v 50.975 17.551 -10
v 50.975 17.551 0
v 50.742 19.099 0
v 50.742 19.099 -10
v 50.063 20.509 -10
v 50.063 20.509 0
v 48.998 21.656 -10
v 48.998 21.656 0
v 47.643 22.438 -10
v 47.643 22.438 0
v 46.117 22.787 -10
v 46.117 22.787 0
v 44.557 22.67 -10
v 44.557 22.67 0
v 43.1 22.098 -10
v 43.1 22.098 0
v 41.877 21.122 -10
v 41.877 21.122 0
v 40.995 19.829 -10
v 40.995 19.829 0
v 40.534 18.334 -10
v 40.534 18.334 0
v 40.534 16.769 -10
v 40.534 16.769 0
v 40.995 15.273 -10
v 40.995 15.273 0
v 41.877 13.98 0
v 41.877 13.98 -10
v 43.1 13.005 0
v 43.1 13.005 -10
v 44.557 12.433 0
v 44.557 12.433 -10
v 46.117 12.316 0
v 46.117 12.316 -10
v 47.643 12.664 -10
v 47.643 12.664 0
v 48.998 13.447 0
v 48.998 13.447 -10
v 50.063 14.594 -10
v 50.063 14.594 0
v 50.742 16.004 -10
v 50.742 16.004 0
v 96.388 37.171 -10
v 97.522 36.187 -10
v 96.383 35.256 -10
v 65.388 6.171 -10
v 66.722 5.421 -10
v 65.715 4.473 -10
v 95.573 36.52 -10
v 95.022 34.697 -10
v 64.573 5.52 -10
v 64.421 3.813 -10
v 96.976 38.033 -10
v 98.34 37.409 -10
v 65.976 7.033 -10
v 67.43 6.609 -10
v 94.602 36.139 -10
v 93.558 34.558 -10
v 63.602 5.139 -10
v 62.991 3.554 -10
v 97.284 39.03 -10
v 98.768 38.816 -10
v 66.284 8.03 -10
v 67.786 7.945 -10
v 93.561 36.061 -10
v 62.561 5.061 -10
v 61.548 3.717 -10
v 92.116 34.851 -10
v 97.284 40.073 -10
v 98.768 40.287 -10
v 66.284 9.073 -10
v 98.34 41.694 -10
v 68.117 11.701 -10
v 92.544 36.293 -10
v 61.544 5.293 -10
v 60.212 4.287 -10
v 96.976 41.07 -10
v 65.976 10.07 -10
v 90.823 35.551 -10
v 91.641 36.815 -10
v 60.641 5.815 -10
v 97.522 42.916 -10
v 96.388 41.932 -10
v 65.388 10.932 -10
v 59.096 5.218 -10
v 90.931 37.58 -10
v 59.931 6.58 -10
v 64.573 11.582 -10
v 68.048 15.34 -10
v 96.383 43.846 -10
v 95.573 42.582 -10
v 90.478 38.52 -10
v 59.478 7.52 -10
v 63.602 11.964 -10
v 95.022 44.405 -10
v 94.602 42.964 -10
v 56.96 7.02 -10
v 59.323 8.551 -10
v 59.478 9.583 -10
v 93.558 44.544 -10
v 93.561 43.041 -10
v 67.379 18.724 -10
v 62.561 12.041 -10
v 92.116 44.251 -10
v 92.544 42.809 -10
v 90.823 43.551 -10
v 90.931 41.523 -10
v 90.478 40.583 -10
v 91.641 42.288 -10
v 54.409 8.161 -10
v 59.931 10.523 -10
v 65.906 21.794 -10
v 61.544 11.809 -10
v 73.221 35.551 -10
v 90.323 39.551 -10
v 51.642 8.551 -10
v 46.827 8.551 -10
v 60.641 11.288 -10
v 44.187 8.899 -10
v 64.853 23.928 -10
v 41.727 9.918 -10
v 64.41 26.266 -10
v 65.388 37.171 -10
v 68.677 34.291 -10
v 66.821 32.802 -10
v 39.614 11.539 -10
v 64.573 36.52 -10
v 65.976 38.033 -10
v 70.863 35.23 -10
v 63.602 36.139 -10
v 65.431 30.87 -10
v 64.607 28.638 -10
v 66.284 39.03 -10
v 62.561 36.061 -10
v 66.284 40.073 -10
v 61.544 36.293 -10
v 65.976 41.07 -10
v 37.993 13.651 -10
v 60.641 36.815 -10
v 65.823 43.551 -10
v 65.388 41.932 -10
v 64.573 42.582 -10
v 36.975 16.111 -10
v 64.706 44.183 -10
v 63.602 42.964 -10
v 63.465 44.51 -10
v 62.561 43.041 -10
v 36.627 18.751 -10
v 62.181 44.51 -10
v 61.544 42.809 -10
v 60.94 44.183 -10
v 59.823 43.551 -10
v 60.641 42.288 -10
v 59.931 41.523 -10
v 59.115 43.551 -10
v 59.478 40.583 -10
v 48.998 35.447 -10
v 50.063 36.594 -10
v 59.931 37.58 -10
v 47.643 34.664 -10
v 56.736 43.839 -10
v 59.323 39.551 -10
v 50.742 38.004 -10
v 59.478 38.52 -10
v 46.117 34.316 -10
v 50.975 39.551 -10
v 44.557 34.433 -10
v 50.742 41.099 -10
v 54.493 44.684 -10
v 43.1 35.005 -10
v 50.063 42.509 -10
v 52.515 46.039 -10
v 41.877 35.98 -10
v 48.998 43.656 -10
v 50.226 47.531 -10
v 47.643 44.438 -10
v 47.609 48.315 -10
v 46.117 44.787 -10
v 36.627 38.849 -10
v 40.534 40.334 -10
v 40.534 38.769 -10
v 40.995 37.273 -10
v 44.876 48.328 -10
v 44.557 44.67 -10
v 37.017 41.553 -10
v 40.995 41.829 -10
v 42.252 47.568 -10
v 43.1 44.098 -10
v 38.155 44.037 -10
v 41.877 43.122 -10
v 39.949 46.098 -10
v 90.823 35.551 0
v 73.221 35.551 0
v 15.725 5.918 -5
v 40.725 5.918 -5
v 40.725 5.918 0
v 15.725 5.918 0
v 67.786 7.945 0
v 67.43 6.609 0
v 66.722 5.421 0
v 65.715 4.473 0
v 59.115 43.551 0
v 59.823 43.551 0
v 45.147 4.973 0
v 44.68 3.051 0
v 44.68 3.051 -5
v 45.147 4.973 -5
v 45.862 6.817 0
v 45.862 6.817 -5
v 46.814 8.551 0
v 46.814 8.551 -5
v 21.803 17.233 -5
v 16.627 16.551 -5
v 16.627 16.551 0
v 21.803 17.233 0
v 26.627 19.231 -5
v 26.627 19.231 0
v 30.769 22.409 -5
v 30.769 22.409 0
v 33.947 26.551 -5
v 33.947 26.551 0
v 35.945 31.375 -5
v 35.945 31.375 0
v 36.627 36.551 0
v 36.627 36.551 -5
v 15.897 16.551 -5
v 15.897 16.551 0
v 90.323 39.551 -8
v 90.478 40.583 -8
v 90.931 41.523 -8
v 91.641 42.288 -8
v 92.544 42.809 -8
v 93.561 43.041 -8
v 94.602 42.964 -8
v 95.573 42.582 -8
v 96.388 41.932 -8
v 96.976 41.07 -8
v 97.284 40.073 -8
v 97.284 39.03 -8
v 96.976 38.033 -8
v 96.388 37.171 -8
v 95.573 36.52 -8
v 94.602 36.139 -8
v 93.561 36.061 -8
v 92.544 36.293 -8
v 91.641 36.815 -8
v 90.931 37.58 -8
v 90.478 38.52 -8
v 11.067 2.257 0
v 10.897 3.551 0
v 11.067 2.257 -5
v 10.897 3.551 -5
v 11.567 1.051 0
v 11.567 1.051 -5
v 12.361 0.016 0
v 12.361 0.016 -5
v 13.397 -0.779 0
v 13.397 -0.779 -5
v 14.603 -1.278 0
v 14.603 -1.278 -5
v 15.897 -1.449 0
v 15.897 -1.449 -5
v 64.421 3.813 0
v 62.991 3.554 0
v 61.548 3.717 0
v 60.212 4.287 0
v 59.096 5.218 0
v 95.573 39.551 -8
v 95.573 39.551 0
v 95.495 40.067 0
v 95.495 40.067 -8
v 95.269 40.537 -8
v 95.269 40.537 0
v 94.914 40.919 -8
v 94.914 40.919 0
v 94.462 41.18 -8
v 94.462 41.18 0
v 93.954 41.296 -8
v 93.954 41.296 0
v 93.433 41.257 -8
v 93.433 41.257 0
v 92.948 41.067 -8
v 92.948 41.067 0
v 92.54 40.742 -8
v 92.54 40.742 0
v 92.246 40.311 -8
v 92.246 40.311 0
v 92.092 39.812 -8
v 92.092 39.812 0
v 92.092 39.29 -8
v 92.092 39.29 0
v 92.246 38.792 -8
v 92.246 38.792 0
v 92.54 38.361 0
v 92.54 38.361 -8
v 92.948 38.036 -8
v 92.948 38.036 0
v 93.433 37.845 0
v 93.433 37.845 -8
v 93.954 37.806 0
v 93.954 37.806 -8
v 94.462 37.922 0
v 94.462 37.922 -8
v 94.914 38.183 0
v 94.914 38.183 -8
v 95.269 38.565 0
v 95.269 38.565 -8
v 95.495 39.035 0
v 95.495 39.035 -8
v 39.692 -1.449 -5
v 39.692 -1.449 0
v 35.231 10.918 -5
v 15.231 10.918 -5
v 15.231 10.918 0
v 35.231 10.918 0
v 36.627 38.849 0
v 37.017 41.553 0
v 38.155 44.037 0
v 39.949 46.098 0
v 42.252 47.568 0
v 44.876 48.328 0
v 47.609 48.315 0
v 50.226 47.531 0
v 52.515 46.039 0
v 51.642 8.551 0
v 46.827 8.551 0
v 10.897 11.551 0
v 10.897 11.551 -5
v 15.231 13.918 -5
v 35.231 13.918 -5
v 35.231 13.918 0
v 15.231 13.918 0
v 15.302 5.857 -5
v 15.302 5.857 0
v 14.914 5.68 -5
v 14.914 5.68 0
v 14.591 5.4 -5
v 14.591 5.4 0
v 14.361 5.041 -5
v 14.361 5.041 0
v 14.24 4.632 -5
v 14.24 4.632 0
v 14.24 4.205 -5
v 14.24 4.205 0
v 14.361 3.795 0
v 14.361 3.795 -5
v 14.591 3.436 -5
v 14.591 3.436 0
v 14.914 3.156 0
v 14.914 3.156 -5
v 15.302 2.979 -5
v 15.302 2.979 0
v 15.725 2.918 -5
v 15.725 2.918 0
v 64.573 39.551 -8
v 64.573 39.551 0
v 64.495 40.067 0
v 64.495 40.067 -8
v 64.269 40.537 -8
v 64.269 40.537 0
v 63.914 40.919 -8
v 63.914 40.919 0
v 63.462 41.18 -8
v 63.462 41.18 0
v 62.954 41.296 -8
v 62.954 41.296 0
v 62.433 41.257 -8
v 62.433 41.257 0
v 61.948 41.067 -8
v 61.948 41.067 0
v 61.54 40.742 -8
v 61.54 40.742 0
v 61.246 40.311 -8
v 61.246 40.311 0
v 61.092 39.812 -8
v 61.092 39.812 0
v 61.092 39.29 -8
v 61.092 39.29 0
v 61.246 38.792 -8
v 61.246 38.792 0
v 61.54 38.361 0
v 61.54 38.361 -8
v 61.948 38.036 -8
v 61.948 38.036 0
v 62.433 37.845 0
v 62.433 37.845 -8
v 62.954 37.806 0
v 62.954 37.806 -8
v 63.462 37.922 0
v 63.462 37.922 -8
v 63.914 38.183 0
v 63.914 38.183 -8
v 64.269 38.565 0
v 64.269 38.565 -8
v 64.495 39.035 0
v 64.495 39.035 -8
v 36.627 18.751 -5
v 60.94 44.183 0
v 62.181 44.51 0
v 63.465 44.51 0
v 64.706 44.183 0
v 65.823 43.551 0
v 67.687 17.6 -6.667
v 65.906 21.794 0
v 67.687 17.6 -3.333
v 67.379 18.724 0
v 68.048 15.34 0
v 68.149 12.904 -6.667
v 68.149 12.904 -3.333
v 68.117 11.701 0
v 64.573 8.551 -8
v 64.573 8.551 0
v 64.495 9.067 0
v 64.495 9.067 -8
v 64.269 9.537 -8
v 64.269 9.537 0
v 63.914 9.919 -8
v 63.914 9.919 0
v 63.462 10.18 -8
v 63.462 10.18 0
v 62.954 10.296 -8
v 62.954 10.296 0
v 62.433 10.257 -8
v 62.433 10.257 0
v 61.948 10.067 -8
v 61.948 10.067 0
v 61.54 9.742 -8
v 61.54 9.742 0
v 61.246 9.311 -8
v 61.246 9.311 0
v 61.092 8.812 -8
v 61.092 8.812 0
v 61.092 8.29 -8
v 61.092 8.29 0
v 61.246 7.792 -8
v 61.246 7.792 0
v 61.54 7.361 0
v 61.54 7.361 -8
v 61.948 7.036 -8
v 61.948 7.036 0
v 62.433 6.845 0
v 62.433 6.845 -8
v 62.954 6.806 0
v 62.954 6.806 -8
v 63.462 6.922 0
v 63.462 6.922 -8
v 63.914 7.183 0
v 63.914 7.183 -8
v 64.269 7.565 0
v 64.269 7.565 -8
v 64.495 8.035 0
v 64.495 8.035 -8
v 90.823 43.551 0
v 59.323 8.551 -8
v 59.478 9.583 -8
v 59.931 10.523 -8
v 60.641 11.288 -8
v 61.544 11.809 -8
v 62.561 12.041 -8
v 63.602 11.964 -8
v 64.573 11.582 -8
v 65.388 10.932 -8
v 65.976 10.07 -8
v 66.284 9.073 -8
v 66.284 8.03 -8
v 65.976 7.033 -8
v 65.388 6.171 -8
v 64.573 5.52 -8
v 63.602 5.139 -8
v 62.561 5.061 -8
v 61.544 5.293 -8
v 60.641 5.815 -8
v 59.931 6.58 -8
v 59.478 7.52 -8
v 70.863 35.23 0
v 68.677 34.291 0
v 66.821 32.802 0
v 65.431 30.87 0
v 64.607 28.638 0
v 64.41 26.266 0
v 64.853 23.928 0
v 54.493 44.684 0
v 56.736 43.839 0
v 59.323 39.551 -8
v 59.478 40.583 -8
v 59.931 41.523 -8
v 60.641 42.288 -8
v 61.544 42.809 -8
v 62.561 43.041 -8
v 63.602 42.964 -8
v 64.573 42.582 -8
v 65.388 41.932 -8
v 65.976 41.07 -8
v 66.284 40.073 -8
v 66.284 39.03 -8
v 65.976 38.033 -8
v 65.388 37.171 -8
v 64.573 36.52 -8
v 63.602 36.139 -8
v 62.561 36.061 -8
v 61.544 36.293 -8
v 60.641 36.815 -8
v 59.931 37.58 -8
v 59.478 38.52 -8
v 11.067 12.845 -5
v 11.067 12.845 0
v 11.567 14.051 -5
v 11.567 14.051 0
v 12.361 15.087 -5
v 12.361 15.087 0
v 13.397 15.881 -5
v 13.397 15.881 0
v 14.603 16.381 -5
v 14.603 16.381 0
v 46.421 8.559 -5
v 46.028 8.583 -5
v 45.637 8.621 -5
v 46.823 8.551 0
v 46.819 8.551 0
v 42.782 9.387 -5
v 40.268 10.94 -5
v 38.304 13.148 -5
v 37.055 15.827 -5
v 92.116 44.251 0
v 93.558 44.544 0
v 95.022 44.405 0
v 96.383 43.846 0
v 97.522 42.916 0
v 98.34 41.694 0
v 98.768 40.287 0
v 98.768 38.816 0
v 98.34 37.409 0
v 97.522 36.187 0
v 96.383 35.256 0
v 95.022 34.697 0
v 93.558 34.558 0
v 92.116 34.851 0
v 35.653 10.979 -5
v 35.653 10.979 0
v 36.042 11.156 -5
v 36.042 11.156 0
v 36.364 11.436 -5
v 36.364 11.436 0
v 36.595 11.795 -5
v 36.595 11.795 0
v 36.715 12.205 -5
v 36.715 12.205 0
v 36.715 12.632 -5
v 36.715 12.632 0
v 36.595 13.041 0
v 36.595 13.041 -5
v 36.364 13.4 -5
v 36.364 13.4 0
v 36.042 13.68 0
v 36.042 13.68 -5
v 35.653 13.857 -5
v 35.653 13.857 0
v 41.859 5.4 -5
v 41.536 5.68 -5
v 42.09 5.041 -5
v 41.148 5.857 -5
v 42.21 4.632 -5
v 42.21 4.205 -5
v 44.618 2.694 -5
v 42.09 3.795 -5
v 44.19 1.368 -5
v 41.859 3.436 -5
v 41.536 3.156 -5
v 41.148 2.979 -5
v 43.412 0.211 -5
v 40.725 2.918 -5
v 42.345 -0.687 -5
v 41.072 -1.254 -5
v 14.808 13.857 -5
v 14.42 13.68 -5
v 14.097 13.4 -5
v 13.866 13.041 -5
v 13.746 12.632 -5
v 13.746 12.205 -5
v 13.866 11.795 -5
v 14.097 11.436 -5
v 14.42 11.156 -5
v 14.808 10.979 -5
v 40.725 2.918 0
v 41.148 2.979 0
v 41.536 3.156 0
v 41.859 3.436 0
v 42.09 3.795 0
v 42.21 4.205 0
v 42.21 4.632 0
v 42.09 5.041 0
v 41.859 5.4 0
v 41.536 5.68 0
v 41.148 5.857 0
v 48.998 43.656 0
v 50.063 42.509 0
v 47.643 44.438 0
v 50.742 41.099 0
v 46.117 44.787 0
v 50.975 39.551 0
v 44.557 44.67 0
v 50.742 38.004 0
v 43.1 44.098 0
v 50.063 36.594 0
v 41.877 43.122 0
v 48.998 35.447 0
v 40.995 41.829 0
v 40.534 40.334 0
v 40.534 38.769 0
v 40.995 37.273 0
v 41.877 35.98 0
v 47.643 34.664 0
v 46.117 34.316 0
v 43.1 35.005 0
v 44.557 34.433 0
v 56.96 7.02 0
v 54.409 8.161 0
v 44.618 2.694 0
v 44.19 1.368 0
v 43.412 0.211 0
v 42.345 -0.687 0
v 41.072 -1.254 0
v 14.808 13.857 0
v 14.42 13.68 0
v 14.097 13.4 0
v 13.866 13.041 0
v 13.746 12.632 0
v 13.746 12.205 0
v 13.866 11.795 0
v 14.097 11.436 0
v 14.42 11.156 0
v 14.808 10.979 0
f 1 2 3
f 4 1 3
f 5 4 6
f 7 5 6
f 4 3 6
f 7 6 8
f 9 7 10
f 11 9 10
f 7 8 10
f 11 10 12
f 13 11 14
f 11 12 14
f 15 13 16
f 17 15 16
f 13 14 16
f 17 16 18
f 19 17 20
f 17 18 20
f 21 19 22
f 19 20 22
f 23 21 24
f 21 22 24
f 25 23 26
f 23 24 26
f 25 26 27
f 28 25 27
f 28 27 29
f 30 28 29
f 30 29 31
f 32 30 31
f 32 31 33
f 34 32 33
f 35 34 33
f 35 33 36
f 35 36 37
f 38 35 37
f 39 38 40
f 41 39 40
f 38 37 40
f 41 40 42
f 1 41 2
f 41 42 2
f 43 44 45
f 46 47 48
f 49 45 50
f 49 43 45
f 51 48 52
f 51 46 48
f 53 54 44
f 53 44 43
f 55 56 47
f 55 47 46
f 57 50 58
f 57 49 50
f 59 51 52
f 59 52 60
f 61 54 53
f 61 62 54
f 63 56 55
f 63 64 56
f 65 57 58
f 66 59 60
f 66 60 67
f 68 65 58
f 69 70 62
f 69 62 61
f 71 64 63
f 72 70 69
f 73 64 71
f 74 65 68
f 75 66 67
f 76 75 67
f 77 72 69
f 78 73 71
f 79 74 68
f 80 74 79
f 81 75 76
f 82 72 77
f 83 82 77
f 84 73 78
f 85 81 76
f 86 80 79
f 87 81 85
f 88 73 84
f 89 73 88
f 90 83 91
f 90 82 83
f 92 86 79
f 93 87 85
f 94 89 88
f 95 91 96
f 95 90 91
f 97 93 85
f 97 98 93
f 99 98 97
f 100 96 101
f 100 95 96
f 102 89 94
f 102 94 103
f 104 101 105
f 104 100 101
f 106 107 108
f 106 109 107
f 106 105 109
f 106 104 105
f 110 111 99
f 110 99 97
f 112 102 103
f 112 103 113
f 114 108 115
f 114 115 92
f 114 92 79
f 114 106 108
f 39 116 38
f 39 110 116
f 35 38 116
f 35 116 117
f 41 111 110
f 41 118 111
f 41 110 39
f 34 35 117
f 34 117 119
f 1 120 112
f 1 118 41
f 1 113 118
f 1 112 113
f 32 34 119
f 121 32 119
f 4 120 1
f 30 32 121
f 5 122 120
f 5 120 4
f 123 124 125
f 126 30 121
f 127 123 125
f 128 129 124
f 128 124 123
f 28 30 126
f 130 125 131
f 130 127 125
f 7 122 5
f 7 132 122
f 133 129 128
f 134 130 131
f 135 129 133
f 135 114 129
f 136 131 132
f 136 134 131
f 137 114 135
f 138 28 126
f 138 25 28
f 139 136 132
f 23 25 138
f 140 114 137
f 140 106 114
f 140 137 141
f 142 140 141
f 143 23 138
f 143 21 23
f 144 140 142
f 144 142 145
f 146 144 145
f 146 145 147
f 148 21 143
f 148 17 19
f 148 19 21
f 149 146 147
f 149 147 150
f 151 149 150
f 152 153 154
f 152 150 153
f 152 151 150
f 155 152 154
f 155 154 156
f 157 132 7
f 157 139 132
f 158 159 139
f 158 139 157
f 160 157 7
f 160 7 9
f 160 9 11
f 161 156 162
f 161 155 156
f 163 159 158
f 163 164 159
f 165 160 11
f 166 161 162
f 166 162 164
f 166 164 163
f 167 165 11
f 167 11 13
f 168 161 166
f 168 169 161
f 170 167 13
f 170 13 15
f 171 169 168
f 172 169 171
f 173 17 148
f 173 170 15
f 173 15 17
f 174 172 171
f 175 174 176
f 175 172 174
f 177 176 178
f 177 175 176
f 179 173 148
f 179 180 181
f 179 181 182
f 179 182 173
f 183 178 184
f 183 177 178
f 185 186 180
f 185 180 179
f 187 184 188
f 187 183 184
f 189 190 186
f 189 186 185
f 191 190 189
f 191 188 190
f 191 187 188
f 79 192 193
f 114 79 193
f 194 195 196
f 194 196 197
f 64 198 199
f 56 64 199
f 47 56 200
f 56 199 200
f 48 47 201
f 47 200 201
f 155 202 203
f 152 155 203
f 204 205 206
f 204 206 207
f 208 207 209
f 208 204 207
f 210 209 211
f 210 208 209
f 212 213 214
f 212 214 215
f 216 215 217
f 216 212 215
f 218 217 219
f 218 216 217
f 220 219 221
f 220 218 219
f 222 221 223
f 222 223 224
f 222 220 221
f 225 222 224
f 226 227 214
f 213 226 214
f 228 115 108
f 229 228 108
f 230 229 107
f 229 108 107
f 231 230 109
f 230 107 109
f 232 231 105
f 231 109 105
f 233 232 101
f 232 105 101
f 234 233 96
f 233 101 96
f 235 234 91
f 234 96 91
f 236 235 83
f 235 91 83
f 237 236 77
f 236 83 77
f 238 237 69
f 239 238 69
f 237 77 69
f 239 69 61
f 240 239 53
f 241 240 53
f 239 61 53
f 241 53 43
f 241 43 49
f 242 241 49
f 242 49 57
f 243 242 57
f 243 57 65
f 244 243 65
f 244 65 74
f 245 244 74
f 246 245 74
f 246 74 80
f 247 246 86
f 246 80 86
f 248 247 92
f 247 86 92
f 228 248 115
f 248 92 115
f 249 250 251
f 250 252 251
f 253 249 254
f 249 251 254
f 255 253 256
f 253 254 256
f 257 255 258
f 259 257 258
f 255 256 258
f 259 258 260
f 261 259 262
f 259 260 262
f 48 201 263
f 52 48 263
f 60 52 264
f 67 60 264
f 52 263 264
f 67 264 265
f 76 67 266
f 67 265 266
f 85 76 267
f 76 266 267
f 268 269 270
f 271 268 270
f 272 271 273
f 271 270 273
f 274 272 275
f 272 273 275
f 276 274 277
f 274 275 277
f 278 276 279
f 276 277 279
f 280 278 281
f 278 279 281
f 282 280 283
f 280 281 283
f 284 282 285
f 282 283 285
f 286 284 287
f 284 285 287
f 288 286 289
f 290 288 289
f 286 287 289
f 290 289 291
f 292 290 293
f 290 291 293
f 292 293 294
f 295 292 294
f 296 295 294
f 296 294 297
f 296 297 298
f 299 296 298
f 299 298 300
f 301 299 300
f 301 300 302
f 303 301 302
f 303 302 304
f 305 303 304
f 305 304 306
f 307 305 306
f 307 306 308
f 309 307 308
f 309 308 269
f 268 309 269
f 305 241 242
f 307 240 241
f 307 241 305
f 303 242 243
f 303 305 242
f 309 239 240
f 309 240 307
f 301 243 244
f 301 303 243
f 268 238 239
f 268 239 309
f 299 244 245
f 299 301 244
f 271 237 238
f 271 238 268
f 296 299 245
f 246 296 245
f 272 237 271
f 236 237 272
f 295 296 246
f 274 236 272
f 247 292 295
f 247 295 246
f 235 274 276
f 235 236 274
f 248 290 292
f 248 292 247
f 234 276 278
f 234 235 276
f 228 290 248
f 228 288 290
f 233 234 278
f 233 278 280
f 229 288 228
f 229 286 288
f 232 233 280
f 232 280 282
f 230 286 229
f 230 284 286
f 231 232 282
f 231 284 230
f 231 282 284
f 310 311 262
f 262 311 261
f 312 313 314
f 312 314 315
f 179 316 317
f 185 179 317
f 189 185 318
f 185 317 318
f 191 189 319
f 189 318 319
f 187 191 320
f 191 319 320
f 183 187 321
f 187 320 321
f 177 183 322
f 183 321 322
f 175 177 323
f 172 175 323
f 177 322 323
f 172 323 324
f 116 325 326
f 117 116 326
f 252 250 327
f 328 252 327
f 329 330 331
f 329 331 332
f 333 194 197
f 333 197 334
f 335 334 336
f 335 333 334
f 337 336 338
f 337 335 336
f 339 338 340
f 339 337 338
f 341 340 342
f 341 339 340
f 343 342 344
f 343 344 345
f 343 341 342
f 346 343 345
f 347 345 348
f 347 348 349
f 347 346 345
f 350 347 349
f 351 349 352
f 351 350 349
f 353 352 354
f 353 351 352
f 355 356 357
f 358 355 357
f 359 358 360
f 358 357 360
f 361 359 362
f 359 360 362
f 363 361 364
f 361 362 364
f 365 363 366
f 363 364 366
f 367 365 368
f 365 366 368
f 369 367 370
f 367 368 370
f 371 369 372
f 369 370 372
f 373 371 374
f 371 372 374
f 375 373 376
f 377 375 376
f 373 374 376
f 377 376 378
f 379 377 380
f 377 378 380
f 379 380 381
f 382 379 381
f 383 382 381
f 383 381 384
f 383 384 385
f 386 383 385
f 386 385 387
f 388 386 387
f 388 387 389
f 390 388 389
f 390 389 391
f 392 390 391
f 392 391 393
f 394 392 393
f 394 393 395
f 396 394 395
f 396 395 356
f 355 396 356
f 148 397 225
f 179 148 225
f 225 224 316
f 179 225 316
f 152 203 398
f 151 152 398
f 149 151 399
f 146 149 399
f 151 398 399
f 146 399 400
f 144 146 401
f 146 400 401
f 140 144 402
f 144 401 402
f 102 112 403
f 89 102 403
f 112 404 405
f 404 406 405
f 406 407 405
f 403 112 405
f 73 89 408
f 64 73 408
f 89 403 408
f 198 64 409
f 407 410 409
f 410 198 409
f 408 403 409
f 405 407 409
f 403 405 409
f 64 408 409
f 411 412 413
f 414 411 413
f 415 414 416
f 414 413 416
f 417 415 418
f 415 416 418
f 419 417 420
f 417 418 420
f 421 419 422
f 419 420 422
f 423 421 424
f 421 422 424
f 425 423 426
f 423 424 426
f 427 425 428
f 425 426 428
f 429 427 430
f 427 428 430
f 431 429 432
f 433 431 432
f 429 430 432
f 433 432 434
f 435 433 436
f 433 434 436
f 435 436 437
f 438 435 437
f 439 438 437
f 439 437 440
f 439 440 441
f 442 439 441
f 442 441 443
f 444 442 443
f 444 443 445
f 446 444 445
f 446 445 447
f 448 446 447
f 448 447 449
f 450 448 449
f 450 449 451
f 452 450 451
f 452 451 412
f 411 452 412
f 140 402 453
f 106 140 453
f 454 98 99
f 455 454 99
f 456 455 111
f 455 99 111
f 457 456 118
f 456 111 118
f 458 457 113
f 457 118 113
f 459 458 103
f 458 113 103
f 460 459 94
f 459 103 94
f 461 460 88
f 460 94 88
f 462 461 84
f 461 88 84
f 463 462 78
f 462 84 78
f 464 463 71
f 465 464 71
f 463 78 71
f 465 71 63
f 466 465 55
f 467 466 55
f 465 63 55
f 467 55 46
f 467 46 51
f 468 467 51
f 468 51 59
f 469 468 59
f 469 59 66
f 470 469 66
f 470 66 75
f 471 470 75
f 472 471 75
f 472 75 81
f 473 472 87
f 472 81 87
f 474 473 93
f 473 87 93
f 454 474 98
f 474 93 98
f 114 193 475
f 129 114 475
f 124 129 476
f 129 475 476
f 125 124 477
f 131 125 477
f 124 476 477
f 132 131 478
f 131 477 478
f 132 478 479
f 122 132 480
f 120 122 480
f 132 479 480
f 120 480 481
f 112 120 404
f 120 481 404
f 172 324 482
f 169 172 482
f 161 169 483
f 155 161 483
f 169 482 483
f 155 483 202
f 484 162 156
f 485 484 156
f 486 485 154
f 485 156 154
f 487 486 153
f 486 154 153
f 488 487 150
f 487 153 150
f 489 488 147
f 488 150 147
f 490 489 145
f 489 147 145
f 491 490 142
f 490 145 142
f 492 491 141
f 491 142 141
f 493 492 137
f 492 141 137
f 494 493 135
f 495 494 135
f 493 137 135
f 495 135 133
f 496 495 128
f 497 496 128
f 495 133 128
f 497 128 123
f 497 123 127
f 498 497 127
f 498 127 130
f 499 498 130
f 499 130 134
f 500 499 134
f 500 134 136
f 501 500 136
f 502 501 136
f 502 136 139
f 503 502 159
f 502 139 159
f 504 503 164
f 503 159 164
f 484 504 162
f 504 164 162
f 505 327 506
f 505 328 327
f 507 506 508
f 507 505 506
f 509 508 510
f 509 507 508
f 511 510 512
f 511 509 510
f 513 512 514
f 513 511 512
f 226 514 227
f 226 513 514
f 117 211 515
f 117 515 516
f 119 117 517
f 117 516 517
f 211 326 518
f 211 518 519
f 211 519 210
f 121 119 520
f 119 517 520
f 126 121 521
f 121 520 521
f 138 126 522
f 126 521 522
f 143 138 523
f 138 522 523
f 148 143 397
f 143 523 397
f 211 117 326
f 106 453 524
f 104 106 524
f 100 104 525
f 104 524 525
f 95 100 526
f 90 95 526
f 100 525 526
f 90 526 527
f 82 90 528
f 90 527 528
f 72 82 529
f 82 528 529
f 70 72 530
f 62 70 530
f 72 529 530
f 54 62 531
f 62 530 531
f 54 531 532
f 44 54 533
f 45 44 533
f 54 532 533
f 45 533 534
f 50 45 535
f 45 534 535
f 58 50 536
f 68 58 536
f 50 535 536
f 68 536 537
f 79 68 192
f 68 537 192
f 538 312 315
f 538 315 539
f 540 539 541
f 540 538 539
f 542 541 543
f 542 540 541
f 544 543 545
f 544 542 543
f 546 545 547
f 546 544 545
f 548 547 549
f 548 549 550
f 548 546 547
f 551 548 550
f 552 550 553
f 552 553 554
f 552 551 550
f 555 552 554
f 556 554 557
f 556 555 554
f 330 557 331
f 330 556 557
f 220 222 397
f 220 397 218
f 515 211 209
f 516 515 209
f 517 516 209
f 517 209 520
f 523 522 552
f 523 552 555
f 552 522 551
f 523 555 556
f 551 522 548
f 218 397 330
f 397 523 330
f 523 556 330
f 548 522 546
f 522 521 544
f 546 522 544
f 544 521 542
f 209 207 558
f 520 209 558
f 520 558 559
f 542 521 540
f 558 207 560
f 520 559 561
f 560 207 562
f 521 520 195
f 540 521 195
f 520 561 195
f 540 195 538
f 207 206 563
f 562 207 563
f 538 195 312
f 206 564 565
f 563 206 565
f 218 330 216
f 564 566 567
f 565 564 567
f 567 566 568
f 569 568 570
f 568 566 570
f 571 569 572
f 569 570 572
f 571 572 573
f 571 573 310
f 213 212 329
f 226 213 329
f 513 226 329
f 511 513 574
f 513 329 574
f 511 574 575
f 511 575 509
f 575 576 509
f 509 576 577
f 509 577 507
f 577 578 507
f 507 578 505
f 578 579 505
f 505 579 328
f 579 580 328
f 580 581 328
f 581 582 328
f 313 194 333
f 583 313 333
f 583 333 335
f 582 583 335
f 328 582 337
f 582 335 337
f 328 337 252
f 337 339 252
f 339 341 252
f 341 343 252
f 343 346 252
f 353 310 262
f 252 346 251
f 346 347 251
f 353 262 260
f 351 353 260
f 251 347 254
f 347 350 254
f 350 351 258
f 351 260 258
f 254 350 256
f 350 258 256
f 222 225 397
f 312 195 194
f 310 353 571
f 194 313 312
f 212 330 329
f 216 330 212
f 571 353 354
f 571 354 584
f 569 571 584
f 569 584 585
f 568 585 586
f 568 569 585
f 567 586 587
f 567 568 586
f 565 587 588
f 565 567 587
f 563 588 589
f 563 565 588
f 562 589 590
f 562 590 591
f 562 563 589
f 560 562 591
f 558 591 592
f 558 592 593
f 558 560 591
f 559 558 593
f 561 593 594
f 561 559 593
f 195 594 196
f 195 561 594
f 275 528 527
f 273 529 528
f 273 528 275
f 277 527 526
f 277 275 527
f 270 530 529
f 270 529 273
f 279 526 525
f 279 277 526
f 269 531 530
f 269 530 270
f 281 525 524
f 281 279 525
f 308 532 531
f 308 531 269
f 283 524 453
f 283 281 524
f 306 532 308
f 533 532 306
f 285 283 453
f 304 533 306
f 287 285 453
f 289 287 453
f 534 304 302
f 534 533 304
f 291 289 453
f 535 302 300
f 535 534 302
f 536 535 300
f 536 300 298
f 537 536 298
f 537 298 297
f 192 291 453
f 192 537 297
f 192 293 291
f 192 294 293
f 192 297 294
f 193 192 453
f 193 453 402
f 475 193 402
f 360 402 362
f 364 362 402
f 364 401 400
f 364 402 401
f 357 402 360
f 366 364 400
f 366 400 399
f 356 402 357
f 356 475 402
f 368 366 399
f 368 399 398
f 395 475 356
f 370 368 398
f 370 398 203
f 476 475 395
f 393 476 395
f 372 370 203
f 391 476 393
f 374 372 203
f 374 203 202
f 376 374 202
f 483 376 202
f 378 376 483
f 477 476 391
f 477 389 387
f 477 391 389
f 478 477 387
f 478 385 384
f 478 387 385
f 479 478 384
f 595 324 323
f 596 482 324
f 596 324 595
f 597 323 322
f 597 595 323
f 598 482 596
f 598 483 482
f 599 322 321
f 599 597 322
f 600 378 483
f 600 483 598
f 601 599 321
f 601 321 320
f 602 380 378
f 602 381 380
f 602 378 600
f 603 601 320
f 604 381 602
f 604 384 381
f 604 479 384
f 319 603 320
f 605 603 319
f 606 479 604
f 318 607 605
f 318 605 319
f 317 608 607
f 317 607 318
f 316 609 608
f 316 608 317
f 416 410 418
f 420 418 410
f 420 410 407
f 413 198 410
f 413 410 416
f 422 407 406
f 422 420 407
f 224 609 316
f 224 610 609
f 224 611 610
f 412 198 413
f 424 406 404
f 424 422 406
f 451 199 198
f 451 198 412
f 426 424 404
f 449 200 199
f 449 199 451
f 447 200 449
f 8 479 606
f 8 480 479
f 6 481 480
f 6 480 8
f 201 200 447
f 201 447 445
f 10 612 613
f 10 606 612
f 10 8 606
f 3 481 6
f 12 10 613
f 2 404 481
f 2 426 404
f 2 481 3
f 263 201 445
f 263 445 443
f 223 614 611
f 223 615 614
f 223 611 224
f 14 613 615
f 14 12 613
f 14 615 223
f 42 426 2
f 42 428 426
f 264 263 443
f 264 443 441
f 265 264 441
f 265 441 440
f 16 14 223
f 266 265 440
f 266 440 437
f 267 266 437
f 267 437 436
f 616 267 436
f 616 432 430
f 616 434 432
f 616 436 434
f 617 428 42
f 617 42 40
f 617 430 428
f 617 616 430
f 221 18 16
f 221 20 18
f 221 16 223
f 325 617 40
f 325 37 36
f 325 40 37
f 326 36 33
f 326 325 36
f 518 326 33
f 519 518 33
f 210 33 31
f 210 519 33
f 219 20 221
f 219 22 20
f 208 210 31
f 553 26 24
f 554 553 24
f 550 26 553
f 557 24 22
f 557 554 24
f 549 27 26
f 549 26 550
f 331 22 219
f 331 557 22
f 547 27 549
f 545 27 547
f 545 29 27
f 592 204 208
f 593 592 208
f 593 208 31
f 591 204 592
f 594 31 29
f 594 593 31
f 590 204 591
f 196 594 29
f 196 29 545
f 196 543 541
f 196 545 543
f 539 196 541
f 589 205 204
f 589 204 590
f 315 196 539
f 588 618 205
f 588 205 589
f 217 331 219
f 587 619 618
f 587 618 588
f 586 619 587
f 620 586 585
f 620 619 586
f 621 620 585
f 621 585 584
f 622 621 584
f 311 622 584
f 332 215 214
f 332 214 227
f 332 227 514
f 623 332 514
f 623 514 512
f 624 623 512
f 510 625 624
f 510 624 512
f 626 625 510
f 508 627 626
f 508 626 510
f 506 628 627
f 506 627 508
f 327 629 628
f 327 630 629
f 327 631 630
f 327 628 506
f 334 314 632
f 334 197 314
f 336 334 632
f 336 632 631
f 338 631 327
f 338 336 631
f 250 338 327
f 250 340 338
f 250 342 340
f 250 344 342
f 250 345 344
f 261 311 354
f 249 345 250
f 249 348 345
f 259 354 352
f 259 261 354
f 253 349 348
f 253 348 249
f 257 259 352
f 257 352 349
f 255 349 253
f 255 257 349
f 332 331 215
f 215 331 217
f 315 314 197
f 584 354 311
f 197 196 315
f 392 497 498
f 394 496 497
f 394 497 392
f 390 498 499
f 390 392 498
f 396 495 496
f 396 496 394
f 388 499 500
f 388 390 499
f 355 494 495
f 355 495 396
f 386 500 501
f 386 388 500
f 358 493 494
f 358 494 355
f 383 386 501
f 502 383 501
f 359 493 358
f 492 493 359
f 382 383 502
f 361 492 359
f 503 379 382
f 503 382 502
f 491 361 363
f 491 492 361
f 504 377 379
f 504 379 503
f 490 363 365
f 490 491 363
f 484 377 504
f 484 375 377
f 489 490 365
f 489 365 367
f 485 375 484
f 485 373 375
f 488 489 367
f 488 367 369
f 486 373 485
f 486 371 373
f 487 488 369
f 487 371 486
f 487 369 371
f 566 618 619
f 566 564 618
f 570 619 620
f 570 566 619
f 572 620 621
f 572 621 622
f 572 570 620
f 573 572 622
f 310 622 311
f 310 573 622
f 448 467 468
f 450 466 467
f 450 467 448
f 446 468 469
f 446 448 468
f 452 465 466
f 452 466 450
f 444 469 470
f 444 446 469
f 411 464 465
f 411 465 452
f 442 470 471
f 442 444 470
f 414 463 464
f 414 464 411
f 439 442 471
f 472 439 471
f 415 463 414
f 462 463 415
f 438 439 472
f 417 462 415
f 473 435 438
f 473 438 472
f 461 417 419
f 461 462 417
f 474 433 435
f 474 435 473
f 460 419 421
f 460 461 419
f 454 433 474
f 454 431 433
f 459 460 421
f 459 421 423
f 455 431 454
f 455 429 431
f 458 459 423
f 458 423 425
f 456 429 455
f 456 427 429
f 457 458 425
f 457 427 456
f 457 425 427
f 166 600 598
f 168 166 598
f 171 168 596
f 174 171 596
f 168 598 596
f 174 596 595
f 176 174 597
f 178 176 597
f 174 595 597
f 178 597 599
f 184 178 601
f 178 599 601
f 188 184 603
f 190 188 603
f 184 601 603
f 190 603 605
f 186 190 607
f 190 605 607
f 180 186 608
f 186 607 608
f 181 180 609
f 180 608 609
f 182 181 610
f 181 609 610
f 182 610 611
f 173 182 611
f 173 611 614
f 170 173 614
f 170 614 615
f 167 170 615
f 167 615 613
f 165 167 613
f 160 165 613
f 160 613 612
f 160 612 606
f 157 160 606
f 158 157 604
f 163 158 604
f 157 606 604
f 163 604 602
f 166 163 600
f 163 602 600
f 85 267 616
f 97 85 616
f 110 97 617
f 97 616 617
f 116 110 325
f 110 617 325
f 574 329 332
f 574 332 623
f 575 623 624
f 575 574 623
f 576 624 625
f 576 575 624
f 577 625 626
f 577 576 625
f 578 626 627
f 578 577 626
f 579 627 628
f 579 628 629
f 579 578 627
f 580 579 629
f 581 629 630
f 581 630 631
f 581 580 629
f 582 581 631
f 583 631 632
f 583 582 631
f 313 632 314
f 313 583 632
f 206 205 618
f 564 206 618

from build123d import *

# Parameters (mm, degrees)
SKETCH1_R           = 1.75
SKETCH1_R_2         = 5.25
BOSS_EXTRUDE1_DEPTH = 10
EXTRUDE1_DEPTH      = 5
FILLET2_R           = 20
FILLET3_R           = 5
FILLET5_R           = 5
EXTRUDE2_DEPTH      = 5
FILLET7_R           = 475
FILLET8_R           = 15
FILLET9_R           = 5
SKETCH4_R           = 3.5
EXTRUDE3_DEPTH      = 2


with BuildPart() as part:
    # Sketch1 → Boss-Extrude1 (new body)
    with BuildSketch(Plane.XY):
        with BuildLine():
            Line((59.115327383, 43.551262968), (59.822811009, 43.551262968))
            ThreePointArc((59.822811009, 43.551262968), (62.822811009, 44.551262968), (65.822811009, 43.551262968))
            Line((65.822811009, 43.551262968), (90.822811009, 43.551262968))
            ThreePointArc((90.822811009, 43.551262968), (98.822811009, 39.551262968), (90.822811009, 35.551262968))
            Line((90.822811009, 35.551262968), (73.221068218, 35.551262968))
            ThreePointArc((73.221068218, 35.551262968), (65.430500205, 30.870379763), (65.905746743, 21.794160382))
            add(Edge.make_bspline(
                [(65.905746743, 21.794160382), (68.510586107, 17.931817085), (68.397648351, 12.955422289), (67.785956814, 7.945306105)],
                knots=[0, 0, 0, 0, 1, 1, 1, 1], degree=3))
            ThreePointArc((67.785956814, 7.945306105), (67.117243875, 5.990433735), (65.715264602, 4.47281814))
            ThreePointArc((65.715264602, 4.47281814), (62.263505272, 3.582643734), (59.096031047, 5.217929635))
            ThreePointArc((59.096031047, 5.217929635), (55.724954026, 7.67997226), (51.642471122, 8.551262968))
            Line((51.642471122, 8.551262968), (46.826949913, 8.551262968))
            ThreePointArc((46.826949913, 8.551262968), (39.614460745, 11.5387738), (36.626949913, 18.751262968))
            Line((36.626949913, 18.751262968), (36.626949913, 38.848632096))
            ThreePointArc((36.626949913, 38.848632096), (42.251881835, 47.568318218), (52.515088487, 46.03881686))
            ThreePointArc((52.515088487, 46.03881686), (55.588605185, 44.19379373), (59.115327383, 43.551262968))
        make_face()
        with Locations((93.822811009, 39.551262968)):
            Circle(SKETCH1_R, mode=Mode.SUBTRACT)
        with Locations((62.822811009, 39.551262968)):
            Circle(SKETCH1_R, mode=Mode.SUBTRACT)
        with Locations((62.822811009, 8.551262968)):
            Circle(SKETCH1_R, mode=Mode.SUBTRACT)
        with Locations((45.725055781, 39.551262968)):
            Circle(SKETCH1_R_2, mode=Mode.SUBTRACT)
        with Locations((45.725055781, 17.551264875)):
            Circle(SKETCH1_R_2, mode=Mode.SUBTRACT)
    extrude(amount=-BOSS_EXTRUDE1_DEPTH)

    # Sketch2 → Extrude1 (add)
    with BuildSketch(Plane.XY):
        Polygon((45.636633265, 8.551262968), (43.896905309, -1.448737032), (10.896905309, -1.448737032), (10.896905309, 16.551262968), (37.366610934, 16.551262968), (39.363957543, 12.249932276), (45.636633265, 10.857586925), align=None)
    extrude(amount=-EXTRUDE1_DEPTH)

    # Fillet2
    # the kernel refuses this fillet: 20 mm, written as the material it adds along each edge
    with BuildSketch(Plane(origin=(36.867030235, 16.551262968, -5), x_dir=(-0.0120031513061412, 0.9999279595844501, 0), z_dir=(0, 0, 1))) as fillet2_piece_1:
        with BuildLine():
            CenterArc((20.241503938, 19.998559192), FILLET2_R, 179.312253574, 90)
            Line((0.242944747, 20.238622218), (-1.756911173, 20.26262852))
            Line((-1.756911173, 20.26262852), (-1.999855919, 0.024006303))
            Line((-1.999855919, 0.024006303), (0.407900213, -1.957962568))
            ThreePointArc((0.407900213, -1.957962568), (2.178716929, -1.786199826), (19.97743461, -1.999855919))
            Line((19.97743461, -1.999855919), (20.001440912, 0))
        make_face()
    extrude(amount=5)

    # Fillet3
    fillet3_edges = [part.edges().sort_by_distance(p)[0] for p in [
        (10.896905309, 16.551262968, -2.5),
    ]]
    fillet(fillet3_edges, radius=FILLET3_R)

    # Fillet5
    fillet5_edges = [part.edges().sort_by_distance(p)[0] for p in [
        (10.896905309, -1.448737032, -2.5),
    ]]
    fillet(fillet5_edges, radius=FILLET5_R)

    # Sketch3 → Extrude2 (cut)
    with BuildSketch(Plane(origin=(0, 0, -5), x_dir=(-1, 0, 0), z_dir=(0, 0, -1))):
        with BuildLine():
            Line((-15.230767467, 10.918134064), (-35.230767467, 10.918134064))
            ThreePointArc((-35.230767467, 10.918134064), (-36.730767467, 12.418134064), (-35.230767467, 13.918134064))
            Line((-35.230767467, 13.918134064), (-15.230767467, 13.918134064))
            ThreePointArc((-15.230767467, 13.918134064), (-13.730767467, 12.418134064), (-15.230767467, 10.918134064))
        make_face()
        with BuildLine():
            Line((-15.725055781, 2.918134064), (-40.725055781, 2.918134064))
            ThreePointArc((-40.725055781, 2.918134064), (-42.225055781, 4.418134064), (-40.725055781, 5.918134064))
            Line((-40.725055781, 5.918134064), (-15.725055781, 5.918134064))
            ThreePointArc((-15.725055781, 5.918134064), (-14.225055781, 4.418134064), (-15.725055781, 2.918134064))
        make_face()
    extrude(amount=-EXTRUDE2_DEPTH, mode=Mode.SUBTRACT)

    # Fillet7
    # the kernel refuses this fillet: 475 mm, written as the material it adds along each edge
    with BuildSketch(Plane(origin=(45.636633265, 8.620954667, -5), x_dir=(0, -1, 0), z_dir=(0, 0, 1))) as fillet7_piece_1:
        with BuildLine():
            CenterArc((475.069322793, 0.591997114), FILLET7_R, 179.929346264, 0.142062041)
            ThreePointArc((0.069683944, 1.17773862), (0.051884348, 0.587860954), (0, 0))
            Line((0, 0), (0.069691699, 0))
        make_face()
    extrude(amount=5)

    # Fillet8
    # the kernel refuses this fillet: 15 mm, written as the material it adds along each edge
    with BuildSketch(Plane(origin=(45.636633265, 8.551262968, 0), x_dir=(0.9999999999783198, 6.584854434625016e-06, 0), z_dir=(0, 0, -1))) as fillet8_piece_1:
        with BuildLine():
            CenterArc((13.821083543, 8.071296621), FILLET8_R, 189.869507231, 22.683962159)
            Line((-0.956926764, 5.500224598), (0, 0))
            ThreePointArc((0, 0), (0.58886931, -0.000365018), (1.17773862, 0))
        make_face()
    extrude(amount=5)

    # Fillet9
    fillet9_edges = [part.edges().sort_by_distance(p)[0] for p in [
        (43.896905309, -1.448737032, -2.5),
    ]]
    fillet(fillet9_edges, radius=FILLET9_R)

    # Sketch4 → Extrude3 (cut)
    with BuildSketch(Plane(origin=(0, 0, -10), x_dir=(-1, 0, 0), z_dir=(0, 0, -1))):
        with Locations((-62.822811009, 39.551262968)):
            Circle(SKETCH4_R)
        with Locations((-93.822811009, 39.551262968)):
            Circle(SKETCH4_R)
        with Locations((-62.822811009, 8.551262968)):
            Circle(SKETCH4_R)
    extrude(amount=-EXTRUDE3_DEPTH, mode=Mode.SUBTRACT)


solid = part.part
